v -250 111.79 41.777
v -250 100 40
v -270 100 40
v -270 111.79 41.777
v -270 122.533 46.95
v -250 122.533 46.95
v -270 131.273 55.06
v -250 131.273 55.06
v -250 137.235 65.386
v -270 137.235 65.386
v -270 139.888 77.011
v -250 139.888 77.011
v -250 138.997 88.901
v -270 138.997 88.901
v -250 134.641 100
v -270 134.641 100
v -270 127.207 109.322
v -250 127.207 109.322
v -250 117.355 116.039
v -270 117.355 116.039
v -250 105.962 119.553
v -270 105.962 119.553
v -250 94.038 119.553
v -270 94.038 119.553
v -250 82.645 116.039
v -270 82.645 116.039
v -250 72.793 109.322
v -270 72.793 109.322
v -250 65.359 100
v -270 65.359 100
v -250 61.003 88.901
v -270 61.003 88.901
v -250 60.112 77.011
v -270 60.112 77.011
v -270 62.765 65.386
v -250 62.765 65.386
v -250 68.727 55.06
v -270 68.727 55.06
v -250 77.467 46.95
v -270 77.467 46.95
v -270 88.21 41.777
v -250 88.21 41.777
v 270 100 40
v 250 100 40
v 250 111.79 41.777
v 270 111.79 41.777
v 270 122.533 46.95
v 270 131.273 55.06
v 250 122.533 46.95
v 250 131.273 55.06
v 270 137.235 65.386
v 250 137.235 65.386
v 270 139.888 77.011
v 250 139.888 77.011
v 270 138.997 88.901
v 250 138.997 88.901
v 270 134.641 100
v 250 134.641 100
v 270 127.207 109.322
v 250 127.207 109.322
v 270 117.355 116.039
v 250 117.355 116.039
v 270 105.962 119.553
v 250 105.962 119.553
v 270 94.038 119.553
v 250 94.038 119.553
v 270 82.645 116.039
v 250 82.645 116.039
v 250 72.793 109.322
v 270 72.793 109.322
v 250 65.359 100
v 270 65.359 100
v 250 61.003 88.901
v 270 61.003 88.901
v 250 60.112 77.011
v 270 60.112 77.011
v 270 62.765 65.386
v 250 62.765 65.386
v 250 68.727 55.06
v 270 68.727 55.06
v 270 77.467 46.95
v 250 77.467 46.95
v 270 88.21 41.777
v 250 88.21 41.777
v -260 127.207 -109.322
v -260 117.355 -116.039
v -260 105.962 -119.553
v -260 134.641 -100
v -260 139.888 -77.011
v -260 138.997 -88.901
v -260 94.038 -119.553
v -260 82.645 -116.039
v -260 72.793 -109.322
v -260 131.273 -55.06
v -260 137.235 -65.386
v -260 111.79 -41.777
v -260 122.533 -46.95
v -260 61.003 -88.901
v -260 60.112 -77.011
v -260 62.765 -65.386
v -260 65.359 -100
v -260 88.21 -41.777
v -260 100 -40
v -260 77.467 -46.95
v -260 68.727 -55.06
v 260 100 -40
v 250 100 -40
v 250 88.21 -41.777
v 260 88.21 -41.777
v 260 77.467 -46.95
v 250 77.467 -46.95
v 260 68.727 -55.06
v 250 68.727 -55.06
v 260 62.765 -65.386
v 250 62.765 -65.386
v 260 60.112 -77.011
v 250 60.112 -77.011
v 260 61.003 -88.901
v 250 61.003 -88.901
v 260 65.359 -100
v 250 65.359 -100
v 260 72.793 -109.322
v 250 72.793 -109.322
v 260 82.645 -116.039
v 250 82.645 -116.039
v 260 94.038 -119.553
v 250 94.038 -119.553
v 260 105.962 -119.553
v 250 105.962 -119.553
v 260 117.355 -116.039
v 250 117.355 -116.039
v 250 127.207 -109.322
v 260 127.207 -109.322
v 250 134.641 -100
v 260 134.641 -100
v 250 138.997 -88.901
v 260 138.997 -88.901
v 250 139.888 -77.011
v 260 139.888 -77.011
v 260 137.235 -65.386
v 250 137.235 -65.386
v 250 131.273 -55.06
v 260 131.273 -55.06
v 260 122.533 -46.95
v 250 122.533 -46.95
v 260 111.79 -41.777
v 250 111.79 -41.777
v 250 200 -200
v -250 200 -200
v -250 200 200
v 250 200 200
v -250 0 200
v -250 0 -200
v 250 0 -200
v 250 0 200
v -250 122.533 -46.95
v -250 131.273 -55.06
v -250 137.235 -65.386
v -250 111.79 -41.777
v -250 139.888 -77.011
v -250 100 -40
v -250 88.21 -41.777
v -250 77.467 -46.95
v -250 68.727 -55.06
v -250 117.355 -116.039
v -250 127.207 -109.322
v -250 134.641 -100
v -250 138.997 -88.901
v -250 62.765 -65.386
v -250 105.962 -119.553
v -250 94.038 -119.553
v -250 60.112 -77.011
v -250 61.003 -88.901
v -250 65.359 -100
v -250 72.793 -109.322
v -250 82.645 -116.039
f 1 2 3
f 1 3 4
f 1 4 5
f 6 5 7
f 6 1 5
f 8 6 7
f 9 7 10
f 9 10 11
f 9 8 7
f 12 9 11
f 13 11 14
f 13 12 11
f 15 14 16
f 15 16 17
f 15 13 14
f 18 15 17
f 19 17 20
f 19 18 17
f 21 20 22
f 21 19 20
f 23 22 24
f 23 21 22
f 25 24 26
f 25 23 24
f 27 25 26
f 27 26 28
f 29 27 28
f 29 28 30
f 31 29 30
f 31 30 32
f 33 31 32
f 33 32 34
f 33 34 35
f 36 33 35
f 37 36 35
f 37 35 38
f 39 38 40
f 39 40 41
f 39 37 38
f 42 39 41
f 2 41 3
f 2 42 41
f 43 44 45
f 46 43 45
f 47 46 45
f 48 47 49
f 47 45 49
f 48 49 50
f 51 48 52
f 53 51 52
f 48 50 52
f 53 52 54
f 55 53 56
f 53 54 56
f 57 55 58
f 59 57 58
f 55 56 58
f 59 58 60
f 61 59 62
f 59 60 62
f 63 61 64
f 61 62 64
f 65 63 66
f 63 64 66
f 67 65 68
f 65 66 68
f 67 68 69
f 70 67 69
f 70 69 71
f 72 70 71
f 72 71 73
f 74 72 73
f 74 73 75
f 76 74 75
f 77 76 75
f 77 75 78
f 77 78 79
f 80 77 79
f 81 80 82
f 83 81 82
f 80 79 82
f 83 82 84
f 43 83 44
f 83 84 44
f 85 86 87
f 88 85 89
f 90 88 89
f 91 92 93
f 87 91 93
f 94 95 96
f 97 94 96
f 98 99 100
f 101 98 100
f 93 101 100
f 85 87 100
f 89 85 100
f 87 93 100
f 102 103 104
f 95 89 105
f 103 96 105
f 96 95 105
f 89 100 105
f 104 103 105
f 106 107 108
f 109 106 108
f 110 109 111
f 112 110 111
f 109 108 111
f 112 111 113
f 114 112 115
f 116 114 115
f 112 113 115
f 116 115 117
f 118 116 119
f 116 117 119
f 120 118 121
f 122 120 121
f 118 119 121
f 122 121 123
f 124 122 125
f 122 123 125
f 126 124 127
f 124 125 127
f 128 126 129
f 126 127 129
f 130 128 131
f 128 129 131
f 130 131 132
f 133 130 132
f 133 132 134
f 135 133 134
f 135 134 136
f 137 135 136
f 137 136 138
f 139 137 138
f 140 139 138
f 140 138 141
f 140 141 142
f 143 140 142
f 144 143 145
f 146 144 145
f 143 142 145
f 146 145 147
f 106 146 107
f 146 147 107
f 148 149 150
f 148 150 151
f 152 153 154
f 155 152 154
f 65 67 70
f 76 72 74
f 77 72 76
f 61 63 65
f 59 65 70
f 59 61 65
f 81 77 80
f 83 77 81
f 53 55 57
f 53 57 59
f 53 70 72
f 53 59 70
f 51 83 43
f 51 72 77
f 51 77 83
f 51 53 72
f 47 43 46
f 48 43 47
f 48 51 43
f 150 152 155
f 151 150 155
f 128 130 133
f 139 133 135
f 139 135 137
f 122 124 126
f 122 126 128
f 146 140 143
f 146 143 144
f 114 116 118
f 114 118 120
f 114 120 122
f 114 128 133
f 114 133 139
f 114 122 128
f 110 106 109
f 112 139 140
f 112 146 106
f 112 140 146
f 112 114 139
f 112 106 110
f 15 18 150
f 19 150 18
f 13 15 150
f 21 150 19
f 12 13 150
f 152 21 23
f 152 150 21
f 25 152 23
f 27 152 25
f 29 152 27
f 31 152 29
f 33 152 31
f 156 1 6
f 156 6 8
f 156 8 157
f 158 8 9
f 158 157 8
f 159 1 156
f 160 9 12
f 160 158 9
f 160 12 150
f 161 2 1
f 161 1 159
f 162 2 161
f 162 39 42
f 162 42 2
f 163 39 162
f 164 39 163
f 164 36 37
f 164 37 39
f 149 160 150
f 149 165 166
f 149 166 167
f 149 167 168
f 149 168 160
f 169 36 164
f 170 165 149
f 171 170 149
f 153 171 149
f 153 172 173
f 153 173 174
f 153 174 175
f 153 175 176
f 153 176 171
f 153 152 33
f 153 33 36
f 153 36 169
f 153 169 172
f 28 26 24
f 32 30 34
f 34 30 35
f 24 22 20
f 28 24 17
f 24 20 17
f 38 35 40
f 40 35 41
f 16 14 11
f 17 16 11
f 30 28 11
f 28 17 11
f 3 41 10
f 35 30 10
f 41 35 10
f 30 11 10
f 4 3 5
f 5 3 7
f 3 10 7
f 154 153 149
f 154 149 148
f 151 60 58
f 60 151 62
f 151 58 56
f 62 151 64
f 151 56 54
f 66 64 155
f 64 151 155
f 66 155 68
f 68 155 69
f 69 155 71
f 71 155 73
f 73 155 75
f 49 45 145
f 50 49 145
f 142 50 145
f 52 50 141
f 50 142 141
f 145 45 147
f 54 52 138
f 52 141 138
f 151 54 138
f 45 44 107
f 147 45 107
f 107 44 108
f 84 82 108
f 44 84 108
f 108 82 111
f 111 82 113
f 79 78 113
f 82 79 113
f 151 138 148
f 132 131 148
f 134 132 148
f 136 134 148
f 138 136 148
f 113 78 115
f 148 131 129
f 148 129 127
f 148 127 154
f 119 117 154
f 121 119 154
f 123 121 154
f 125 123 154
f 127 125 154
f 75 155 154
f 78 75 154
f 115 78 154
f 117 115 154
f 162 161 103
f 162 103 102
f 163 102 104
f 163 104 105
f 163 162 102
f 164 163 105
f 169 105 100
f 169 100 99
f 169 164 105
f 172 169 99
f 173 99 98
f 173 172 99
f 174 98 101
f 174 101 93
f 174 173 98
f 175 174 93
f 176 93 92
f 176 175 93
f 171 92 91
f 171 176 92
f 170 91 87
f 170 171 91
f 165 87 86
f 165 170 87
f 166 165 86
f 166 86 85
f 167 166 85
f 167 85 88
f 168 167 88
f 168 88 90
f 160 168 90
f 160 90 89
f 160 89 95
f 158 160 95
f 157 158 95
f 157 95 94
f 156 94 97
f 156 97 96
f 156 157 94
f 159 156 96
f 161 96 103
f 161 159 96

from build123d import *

# Parameters (mm, degrees)
SKETCH_2_W      = 500
SKETCH_2_H      = 400
EXTRUDE_1_DEPTH = 200
SKETCH_3_R      = 40
EXTRUDE_2_DEPTH = 10
SKETCH_3_3_R    = 40
EXTRUDE_3_DEPTH = 20


with BuildPart() as part:
    # 草图2 → 凸台-拉伸1 (new body)
    with BuildSketch(Plane(origin=(0, 0, 0), x_dir=(1, 0, 0), z_dir=(0, 1, 0))):
        Rectangle(SKETCH_2_W, SKETCH_2_H)
    extrude(amount=EXTRUDE_1_DEPTH)

    # 草图3 → 凸台-拉伸2 (add)
    with BuildSketch(Plane(origin=(250, 0, 0), x_dir=(0, 0, -1), z_dir=(1, 0, 0))):
        with Locations((80, 100)):
            Circle(SKETCH_3_R)
    extrude_2 = extrude(amount=EXTRUDE_2_DEPTH)

    # 草图3<3> → 凸台-拉伸3 (add)
    with BuildSketch(Plane(origin=(250, 0, 0), x_dir=(0, 0, -1), z_dir=(1, 0, 0))):
        with Locations((-80, 100)):
            Circle(SKETCH_3_3_R)
    extrude_3 = extrude(amount=EXTRUDE_3_DEPTH)

    # 镜向1: 凸台-拉伸2, 凸台-拉伸3 across plane
    add(extrude_2.mirror(Plane(origin=(0, 0, 0), x_dir=(0, 0, 1), z_dir=(1, 0, 0))))
    add(extrude_3.mirror(Plane(origin=(0, 0, 0), x_dir=(0, 0, 1), z_dir=(1, 0, 0))))


solid = part.part
